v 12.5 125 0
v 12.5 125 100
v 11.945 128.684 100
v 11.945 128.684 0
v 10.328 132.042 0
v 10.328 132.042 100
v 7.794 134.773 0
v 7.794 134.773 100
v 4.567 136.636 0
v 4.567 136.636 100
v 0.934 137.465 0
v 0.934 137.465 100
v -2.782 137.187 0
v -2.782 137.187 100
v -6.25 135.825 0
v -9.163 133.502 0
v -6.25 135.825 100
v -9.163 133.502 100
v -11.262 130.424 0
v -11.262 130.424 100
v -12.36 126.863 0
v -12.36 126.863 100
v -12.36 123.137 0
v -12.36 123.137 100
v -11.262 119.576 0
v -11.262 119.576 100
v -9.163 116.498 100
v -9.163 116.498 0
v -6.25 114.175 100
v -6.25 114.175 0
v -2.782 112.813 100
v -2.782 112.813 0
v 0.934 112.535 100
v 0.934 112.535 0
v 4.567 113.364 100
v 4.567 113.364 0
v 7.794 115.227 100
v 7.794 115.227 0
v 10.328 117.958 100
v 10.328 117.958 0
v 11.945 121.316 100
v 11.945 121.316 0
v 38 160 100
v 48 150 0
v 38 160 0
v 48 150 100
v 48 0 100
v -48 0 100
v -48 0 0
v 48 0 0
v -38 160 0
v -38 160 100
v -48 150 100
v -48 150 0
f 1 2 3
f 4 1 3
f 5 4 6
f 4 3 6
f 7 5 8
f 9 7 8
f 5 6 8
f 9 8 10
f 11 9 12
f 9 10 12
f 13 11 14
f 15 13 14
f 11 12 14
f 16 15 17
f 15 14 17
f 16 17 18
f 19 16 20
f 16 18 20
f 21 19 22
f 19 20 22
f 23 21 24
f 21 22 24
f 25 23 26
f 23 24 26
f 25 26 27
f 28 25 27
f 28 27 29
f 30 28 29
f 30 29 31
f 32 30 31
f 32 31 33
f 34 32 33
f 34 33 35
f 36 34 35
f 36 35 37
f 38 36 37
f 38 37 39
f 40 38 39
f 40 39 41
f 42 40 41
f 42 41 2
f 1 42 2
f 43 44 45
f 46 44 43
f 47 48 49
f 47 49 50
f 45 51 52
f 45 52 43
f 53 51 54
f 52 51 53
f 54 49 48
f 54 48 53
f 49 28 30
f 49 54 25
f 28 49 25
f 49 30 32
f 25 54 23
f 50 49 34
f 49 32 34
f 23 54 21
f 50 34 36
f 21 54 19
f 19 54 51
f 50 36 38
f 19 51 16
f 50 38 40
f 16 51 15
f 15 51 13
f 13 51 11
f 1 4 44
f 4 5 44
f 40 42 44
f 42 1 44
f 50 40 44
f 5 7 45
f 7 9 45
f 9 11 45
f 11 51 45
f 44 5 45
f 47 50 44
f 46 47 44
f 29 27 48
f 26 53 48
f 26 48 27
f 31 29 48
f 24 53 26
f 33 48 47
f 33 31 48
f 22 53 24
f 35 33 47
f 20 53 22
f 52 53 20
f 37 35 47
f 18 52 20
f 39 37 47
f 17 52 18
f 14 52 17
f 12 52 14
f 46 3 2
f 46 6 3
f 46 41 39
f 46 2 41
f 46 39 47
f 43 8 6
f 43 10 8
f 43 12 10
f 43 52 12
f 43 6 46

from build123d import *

# Parameters (mm, degrees)
SKETCH1_W           = 96
SKETCH1_H           = 160
BOSS_EXTRUDE1_DEPTH = 100
SKETCH2_R           = 12.5
CUT_EXTRUDE1_DEPTH  = 195.689496378
CHAMFER1_SIZE       = 10


with BuildPart() as part:
    # Sketch1 → Boss-Extrude1 (new body)
    with BuildSketch(Plane.XY):
        with Locations((0, 80)):
            Rectangle(SKETCH1_W, SKETCH1_H)
    extrude(amount=BOSS_EXTRUDE1_DEPTH)

    # Sketch2 → Cut-Extrude1 (cut, through all)
    with BuildSketch(Plane.XY.offset(100)):
        with Locations((0, 125)):
            Circle(SKETCH2_R)
    extrude(amount=-CUT_EXTRUDE1_DEPTH, mode=Mode.SUBTRACT)

    # Chamfer1
    chamfer1_edges = [part.edges().sort_by_distance(p)[0] for p in [
        (-48, 160, 50),
        (48, 160, 50),
    ]]
    chamfer(chamfer1_edges, length=CHAMFER1_SIZE)


solid = part.part
